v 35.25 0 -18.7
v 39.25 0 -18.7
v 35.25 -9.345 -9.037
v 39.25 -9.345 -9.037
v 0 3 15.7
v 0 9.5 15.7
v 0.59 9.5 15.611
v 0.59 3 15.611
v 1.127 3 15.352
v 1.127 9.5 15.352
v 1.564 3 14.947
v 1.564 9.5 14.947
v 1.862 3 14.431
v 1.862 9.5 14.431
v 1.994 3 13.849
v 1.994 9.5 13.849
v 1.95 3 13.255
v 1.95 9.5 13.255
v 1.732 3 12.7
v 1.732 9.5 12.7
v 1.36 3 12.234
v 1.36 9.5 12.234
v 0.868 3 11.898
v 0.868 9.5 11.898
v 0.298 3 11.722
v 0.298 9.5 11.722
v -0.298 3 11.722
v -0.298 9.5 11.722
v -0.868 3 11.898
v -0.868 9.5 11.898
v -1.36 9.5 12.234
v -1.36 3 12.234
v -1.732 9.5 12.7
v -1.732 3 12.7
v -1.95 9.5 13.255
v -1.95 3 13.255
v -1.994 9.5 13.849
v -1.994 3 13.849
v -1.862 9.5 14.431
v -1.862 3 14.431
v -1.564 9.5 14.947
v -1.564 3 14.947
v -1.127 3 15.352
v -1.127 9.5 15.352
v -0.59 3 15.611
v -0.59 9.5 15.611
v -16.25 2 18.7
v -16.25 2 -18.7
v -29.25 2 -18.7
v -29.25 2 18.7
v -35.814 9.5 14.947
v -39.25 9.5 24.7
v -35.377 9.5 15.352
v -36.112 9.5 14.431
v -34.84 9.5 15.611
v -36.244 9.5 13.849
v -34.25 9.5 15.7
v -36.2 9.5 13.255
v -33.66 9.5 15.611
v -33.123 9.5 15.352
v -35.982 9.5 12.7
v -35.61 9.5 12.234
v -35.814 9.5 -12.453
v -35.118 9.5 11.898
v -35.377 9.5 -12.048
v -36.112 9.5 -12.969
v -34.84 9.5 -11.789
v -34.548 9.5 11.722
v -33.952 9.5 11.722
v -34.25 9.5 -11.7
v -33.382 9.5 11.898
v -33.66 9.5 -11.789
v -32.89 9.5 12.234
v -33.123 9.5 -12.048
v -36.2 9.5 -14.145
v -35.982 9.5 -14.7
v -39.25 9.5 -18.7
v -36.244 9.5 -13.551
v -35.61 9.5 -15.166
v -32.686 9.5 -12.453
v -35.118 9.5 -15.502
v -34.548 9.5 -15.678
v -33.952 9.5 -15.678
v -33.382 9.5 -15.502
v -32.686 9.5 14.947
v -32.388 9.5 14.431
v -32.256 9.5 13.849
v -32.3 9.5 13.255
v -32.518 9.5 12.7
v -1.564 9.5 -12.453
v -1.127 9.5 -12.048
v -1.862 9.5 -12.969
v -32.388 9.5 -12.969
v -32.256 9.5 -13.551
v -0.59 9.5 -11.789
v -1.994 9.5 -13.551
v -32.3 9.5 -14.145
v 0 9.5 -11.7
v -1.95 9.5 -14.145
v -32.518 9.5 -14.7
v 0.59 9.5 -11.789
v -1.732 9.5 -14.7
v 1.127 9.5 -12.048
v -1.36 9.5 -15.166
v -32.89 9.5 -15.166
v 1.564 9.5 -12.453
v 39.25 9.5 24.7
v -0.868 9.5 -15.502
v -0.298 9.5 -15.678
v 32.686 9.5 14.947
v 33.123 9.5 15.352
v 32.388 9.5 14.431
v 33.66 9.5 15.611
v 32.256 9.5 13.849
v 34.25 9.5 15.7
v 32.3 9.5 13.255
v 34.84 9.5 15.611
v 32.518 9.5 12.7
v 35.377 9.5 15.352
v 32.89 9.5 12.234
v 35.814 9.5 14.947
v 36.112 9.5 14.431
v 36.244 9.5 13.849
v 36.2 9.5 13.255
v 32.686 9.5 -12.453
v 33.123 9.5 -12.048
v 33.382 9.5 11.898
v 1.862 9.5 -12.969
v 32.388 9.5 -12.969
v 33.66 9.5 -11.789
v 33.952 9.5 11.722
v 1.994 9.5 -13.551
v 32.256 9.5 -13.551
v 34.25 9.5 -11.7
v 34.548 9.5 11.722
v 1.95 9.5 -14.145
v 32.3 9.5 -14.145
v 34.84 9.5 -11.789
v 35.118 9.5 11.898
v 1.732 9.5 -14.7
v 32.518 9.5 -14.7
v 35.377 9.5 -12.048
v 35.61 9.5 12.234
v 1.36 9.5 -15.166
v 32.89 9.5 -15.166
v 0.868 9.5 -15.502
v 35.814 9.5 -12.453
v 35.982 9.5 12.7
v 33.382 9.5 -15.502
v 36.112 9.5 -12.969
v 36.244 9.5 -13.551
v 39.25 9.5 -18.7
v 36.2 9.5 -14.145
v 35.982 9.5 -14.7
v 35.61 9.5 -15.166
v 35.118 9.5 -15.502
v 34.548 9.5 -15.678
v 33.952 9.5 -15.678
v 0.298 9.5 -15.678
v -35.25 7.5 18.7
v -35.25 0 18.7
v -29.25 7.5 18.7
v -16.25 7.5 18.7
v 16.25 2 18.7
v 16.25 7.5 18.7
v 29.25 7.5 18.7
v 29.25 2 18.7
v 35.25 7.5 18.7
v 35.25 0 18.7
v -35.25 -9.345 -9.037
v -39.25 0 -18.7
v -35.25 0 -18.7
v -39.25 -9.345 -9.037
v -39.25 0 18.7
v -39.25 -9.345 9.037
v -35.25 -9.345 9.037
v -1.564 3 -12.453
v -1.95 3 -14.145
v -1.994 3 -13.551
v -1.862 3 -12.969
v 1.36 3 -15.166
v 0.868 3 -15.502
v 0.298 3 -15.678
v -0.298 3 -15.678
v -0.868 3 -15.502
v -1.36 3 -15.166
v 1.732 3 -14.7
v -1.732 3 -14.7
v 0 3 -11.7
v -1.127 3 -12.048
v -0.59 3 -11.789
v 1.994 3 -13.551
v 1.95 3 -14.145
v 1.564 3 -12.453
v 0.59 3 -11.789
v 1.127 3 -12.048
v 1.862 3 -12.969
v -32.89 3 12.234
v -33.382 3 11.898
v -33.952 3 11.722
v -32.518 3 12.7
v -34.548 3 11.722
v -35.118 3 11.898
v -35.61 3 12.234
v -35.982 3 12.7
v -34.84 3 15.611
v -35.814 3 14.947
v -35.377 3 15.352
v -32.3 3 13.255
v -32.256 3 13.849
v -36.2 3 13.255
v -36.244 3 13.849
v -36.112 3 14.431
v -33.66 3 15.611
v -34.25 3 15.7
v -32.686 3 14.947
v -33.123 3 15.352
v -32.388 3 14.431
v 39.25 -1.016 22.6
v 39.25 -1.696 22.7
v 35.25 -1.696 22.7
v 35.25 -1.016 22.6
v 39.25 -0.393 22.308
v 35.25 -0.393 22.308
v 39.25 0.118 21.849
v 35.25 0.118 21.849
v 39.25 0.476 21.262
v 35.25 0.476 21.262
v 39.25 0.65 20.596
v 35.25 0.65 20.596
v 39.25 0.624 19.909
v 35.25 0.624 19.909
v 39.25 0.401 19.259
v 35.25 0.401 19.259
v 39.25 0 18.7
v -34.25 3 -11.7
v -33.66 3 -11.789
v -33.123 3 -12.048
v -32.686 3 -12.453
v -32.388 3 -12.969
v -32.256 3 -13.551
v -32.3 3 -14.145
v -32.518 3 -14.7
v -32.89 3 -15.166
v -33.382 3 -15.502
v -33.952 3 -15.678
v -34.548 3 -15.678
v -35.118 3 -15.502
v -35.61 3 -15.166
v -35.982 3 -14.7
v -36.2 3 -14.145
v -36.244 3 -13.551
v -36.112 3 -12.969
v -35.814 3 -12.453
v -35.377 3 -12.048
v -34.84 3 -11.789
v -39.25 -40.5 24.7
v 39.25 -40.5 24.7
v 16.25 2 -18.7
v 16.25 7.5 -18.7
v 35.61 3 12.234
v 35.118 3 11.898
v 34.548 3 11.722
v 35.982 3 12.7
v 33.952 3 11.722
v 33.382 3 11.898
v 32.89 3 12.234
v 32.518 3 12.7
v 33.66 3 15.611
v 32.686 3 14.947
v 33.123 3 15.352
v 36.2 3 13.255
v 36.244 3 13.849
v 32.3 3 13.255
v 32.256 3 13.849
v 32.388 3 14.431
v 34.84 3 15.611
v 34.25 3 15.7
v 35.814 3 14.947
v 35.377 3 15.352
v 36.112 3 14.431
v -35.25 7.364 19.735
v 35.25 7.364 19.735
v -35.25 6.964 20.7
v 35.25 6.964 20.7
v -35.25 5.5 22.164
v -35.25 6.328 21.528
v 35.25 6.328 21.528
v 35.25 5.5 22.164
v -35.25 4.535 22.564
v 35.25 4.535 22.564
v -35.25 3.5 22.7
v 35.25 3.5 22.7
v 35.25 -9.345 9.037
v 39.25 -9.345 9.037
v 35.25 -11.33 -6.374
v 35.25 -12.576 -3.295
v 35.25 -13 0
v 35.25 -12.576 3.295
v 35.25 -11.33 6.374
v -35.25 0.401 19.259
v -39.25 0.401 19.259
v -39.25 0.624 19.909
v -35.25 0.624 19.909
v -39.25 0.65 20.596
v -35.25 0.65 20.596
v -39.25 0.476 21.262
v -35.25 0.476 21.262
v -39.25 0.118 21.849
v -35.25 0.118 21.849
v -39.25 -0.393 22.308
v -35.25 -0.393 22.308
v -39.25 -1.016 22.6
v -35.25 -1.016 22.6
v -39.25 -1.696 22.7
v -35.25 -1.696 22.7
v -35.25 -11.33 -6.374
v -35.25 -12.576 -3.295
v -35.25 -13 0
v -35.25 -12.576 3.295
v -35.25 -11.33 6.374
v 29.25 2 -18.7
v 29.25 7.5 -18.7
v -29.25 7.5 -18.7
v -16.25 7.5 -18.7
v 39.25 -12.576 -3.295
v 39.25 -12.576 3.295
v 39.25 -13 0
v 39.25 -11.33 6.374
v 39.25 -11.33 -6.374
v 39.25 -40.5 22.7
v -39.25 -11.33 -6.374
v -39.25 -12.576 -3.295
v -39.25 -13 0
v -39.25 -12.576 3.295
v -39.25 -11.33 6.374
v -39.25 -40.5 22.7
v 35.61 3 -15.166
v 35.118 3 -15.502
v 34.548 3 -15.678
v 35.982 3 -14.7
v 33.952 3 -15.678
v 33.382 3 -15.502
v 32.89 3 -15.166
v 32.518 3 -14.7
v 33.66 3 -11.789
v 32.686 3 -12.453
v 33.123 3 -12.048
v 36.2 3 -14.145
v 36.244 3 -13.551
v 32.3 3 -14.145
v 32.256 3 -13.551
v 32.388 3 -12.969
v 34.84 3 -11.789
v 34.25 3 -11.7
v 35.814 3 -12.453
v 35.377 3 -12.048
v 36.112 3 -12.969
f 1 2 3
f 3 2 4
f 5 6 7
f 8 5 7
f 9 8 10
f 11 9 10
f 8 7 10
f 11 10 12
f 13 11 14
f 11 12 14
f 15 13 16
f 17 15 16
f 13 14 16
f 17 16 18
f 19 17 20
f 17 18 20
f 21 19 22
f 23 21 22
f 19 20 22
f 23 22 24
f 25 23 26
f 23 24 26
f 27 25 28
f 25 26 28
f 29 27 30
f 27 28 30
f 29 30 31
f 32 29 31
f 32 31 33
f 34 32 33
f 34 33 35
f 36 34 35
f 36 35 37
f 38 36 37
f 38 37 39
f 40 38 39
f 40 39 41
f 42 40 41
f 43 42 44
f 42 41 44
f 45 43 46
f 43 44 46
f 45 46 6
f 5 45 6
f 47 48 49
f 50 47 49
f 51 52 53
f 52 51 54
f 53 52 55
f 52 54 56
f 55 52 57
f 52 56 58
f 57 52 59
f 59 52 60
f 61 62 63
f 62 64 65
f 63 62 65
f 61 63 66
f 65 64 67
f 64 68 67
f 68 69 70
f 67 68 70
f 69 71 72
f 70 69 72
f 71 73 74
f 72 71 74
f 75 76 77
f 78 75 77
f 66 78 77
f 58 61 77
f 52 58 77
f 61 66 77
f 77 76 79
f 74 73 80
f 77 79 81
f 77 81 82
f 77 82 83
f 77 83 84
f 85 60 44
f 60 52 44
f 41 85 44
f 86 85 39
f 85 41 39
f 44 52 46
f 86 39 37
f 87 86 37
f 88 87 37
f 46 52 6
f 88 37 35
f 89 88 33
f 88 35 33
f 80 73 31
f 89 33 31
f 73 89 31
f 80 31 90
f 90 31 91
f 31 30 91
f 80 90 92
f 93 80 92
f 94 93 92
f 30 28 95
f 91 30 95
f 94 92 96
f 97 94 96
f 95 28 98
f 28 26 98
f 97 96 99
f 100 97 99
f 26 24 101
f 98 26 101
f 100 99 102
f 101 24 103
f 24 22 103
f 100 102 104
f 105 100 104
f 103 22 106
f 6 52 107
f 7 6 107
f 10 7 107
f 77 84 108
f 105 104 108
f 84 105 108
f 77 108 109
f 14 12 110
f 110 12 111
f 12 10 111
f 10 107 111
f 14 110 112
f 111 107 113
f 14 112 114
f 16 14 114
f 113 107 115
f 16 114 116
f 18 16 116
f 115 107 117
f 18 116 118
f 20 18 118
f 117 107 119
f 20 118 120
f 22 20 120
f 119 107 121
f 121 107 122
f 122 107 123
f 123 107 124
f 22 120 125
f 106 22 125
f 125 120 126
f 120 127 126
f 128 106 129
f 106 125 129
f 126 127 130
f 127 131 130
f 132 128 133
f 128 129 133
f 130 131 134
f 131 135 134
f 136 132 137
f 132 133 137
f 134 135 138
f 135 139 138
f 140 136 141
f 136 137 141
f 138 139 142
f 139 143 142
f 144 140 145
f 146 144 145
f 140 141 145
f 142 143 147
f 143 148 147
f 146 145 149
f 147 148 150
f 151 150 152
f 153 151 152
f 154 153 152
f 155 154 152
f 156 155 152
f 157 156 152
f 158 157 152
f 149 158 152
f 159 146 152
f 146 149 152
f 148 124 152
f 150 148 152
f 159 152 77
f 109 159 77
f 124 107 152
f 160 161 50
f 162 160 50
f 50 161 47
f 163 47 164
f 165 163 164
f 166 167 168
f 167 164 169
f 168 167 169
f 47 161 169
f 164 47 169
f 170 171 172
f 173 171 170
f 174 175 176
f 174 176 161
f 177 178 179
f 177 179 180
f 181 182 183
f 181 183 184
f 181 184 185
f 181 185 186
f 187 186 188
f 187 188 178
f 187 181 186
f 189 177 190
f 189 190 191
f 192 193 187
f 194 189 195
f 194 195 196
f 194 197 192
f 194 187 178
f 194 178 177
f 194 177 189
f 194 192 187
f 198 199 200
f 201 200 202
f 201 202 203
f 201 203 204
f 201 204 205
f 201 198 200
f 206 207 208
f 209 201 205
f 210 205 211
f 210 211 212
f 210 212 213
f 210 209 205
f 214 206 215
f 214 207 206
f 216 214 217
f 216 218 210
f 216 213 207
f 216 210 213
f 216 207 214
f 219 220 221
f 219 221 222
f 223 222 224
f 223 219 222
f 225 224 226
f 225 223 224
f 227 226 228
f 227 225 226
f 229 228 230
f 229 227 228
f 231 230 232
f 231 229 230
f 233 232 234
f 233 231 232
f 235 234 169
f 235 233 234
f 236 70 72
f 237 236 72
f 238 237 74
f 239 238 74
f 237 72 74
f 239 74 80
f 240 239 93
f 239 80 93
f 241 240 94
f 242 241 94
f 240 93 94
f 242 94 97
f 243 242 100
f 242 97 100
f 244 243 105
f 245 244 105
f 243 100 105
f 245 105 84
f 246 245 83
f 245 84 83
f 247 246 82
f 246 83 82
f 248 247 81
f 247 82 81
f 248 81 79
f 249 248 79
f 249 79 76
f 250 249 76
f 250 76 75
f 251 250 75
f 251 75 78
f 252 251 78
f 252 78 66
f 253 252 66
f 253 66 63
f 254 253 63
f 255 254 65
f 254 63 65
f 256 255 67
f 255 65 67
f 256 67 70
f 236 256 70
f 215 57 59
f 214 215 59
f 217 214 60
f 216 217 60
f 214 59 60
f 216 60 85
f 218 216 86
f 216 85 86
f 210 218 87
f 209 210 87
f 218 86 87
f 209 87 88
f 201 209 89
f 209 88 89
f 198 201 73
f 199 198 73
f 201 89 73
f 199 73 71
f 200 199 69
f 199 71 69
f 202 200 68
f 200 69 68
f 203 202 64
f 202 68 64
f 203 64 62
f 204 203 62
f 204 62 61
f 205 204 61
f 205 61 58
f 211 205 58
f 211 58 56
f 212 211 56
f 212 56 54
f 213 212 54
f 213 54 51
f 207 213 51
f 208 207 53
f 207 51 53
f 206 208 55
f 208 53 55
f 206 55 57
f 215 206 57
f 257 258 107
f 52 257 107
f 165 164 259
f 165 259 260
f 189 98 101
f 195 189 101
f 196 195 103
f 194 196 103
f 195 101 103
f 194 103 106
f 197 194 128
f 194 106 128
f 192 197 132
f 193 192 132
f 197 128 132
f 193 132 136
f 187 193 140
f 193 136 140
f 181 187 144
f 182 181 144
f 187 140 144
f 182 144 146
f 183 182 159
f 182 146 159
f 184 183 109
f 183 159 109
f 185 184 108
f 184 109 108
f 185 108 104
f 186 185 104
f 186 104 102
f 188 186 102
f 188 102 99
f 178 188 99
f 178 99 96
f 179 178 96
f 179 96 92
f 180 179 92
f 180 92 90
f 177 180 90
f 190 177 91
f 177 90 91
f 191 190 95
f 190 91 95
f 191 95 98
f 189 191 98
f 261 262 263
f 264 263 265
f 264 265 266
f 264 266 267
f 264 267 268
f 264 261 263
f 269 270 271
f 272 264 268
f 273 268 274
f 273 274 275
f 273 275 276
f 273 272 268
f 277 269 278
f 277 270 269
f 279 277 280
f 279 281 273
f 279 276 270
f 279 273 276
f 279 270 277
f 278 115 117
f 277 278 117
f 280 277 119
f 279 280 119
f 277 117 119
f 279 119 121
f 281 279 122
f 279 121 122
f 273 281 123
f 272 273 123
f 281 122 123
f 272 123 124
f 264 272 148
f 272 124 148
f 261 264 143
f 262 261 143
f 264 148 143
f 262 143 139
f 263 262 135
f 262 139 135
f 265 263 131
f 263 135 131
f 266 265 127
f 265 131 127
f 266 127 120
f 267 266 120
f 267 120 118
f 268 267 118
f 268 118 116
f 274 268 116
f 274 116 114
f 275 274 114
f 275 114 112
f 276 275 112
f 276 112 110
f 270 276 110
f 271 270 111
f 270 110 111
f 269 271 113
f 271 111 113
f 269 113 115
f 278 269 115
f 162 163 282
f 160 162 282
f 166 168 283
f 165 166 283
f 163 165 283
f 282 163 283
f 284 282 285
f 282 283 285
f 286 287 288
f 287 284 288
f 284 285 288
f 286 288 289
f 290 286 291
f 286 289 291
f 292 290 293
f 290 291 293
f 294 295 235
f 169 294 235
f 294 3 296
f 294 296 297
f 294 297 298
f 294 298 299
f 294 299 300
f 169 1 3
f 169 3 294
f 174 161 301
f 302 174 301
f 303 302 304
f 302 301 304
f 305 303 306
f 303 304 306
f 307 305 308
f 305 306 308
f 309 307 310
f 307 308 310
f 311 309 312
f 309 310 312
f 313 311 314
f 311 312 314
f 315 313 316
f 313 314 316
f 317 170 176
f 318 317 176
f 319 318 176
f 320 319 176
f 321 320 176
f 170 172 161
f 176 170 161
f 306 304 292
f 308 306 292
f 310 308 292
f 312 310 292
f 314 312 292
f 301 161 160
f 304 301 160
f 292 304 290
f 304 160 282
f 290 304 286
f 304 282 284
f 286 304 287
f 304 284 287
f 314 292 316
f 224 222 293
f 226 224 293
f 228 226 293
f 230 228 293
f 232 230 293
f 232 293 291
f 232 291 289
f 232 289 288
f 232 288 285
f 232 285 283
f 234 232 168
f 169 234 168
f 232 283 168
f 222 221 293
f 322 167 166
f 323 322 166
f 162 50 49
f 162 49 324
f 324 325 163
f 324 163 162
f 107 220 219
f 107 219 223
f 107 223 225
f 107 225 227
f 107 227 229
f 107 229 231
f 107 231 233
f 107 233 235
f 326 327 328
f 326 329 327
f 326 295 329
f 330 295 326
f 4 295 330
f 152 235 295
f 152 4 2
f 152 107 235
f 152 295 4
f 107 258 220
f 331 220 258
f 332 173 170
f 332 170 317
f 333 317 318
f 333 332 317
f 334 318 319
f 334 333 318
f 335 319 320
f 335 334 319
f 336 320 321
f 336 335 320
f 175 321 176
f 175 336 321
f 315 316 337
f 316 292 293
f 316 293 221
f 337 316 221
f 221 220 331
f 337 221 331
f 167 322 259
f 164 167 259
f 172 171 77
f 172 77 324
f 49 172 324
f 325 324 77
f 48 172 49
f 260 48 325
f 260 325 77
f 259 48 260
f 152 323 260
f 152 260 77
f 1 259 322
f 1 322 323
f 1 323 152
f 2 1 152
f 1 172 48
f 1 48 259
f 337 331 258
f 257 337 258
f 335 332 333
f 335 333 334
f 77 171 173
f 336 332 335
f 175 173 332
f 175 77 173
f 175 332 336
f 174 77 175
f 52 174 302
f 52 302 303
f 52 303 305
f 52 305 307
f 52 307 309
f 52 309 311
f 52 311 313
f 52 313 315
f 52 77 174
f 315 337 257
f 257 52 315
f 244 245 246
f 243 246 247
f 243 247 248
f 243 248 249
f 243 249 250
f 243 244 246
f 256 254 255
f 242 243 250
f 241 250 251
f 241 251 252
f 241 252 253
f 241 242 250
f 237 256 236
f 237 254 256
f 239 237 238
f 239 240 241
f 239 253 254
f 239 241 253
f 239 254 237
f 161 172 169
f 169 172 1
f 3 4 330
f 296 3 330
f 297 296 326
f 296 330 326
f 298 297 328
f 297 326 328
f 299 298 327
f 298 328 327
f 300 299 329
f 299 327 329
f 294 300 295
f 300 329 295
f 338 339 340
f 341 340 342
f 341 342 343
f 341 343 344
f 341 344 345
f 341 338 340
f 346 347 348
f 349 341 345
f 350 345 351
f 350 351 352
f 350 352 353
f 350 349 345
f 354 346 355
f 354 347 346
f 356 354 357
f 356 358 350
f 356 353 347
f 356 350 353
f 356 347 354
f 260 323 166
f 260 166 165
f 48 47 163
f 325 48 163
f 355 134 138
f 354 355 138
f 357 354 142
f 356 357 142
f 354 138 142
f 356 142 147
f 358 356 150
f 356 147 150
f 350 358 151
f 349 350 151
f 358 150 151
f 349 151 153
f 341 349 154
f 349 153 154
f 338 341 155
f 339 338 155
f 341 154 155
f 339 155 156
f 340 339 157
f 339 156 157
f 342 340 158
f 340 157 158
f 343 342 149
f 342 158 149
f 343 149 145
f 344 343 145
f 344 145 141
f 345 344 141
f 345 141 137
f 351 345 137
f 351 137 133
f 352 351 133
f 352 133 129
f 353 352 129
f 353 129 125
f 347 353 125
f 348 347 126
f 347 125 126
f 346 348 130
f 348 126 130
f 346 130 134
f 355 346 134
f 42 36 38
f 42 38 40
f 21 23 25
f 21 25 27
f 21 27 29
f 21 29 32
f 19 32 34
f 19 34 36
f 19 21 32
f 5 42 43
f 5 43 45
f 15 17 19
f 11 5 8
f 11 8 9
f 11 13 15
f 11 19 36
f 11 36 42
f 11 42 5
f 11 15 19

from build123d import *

# Parameters (mm, degrees)
SKETCH1_W           = 78.5
SKETCH1_H           = 37.4
BOSS_EXTRUDE1_DEPTH = 9.5
SKETCH6_R           = 2
CUT_EXTRUDE1_DEPTH  = 6.5
BOSS_EXTRUDE2_DEPTH = 4
SKETCH9_W           = 13
SKETCH9_H           = 5.5
CUT_EXTRUDE3_DEPTH  = 56.75233179
BOSS_EXTRUDE3_REACH = 83.737
BOSS_EXTRUDE4_START = -4
BOSS_EXTRUDE4_DEPTH = 4
BOSS_EXTRUDE5_DEPTH = 4


with BuildPart() as part:
    # Sketch1 → Boss-Extrude1 (new body)
    with BuildSketch(Plane(origin=(0, 0, 0), x_dir=(1, 0, 0), z_dir=(0, 1, 0))):
        Rectangle(SKETCH1_W, SKETCH1_H)
    extrude(amount=BOSS_EXTRUDE1_DEPTH)

    # Sketch6 → Cut-Extrude1 (cut)
    with BuildSketch(Plane(origin=(0, 9.5, 0), x_dir=(1, 0, 0), z_dir=(0, 1, 0))):
        with Locations(Location((-34.25, 13.7, 0), (0, 0, 270))):
            Circle(SKETCH6_R)
        with Locations(Location((0, 13.7, 0), (0, 0, 270))):
            Circle(SKETCH6_R)
        with Locations(Location((34.25, 13.7, 0), (0, 0, 270))):
            Circle(SKETCH6_R)
        with Locations(Location((34.25, -13.7, 0), (0, 0, 270))):
            Circle(SKETCH6_R)
        with Locations(Location((0, -13.7, 0), (0, 0, 270))):
            Circle(SKETCH6_R)
        with Locations(Location((-34.25, -13.7, 0), (0, 0, 270))):
            Circle(SKETCH6_R)
    extrude(amount=-CUT_EXTRUDE1_DEPTH, mode=Mode.SUBTRACT)

    # Sketch7 → Boss-Extrude2 (add)
    with BuildSketch(Plane.ZY.offset(39.25)):
        with BuildLine():
            Line((-18.7, 0), (-9.037433155, -9.344774046))
            ThreePointArc((-9.037433155, -9.344774046), (0, -13), (9.037433155, -9.344774046))
            Line((9.037433155, -9.344774046), (18.7, 0))
            Line((18.7, 0), (-18.7, 0))
        make_face()
    boss_extrude2 = extrude(amount=-BOSS_EXTRUDE2_DEPTH)

    # Mirror1: Boss-Extrude2 across plane
    add(boss_extrude2.mirror(Plane(origin=(0, 0, 0), x_dir=(0, 0, 1), z_dir=(1, 0, 0))))

    # Sketch9 → Cut-Extrude3 (cut, through all)
    with BuildSketch(Plane(origin=(0, 0, -18.7), x_dir=(-1, 0, 0), z_dir=(0, 0, -1))):
        with Locations((22.75, 4.75)):
            Rectangle(SKETCH9_W, SKETCH9_H)
        with Locations((-22.75, 4.75)):
            Rectangle(SKETCH9_W, SKETCH9_H)
    extrude(amount=-CUT_EXTRUDE3_DEPTH, mode=Mode.SUBTRACT)

    # Boss-Extrude3: up to this face of the body (flat: up to its plane)
    boss_extrude3_end = Plane(part.part.faces().sort_by_distance((-39.25, 0.189608499, 0))[0])
    # Sketch10 → Boss-Extrude3 (add, up to the picked face)
    with BuildSketch(Plane(origin=(39.25, 0, 0), x_dir=(0, 0, -1), z_dir=(1, 0, 0)), mode=Mode.PRIVATE) as boss_extrude3_sk1:
        with BuildLine():
            Line((-22.7, -40.5), (-24.7, -40.5))
            Line((-24.7, -40.5), (-24.7, 9.5))
            Line((-24.7, 9.5), (-18.7, 9.5))
            Line((-18.7, 9.5), (-18.7, 7.5))
            ThreePointArc((-18.7, 7.5), (-21.528427125, 6.328427125), (-22.7, 3.5))
            Line((-22.7, 3.5), (-22.7, -40.5))
        make_face()
    boss_extrude3_tool1 = split(extrude(boss_extrude3_sk1.sketch, amount=-BOSS_EXTRUDE3_REACH, mode=Mode.PRIVATE), bisect_by=boss_extrude3_end, keep=Keep.BOTH, mode=Mode.PRIVATE)
    add(boss_extrude3_tool1.solids().sort_by(Axis((39.25, -13.095828, 23.426281), (-1, 0, 0)))[0])

    # Sketch11 → Boss-Extrude4 (add)
    with BuildSketch(Plane.ZY.offset(39.25).offset(BOSS_EXTRUDE4_START)):
        with BuildLine():
            Line((18.7, 7.5), (18.7, 0))
            ThreePointArc((18.7, 0), (21.261557408, 0.476218058), (22.7, -1.696163792))
            Line((22.7, -1.696163792), (22.7, 3.5))
            ThreePointArc((22.7, 3.5), (21.528427125, 6.328427125), (18.7, 7.5))
        make_face()
    extrude(amount=BOSS_EXTRUDE4_DEPTH)

    # Sketch12 → Boss-Extrude5 (add)
    with BuildSketch(Plane(origin=(39.25, 0, 0), x_dir=(0, 0, -1), z_dir=(1, 0, 0))):
        with BuildLine():
            Line((-18.7, 0), (-18.7, 7.5))
            ThreePointArc((-18.7, 7.5), (-21.528427125, 6.328427125), (-22.7, 3.5))
            Line((-22.7, 3.5), (-22.7, -1.696163792))
            ThreePointArc((-22.7, -1.696163792), (-21.261557408, 0.476218058), (-18.7, 0))
        make_face()
    extrude(amount=-BOSS_EXTRUDE5_DEPTH)


solid = part.part
